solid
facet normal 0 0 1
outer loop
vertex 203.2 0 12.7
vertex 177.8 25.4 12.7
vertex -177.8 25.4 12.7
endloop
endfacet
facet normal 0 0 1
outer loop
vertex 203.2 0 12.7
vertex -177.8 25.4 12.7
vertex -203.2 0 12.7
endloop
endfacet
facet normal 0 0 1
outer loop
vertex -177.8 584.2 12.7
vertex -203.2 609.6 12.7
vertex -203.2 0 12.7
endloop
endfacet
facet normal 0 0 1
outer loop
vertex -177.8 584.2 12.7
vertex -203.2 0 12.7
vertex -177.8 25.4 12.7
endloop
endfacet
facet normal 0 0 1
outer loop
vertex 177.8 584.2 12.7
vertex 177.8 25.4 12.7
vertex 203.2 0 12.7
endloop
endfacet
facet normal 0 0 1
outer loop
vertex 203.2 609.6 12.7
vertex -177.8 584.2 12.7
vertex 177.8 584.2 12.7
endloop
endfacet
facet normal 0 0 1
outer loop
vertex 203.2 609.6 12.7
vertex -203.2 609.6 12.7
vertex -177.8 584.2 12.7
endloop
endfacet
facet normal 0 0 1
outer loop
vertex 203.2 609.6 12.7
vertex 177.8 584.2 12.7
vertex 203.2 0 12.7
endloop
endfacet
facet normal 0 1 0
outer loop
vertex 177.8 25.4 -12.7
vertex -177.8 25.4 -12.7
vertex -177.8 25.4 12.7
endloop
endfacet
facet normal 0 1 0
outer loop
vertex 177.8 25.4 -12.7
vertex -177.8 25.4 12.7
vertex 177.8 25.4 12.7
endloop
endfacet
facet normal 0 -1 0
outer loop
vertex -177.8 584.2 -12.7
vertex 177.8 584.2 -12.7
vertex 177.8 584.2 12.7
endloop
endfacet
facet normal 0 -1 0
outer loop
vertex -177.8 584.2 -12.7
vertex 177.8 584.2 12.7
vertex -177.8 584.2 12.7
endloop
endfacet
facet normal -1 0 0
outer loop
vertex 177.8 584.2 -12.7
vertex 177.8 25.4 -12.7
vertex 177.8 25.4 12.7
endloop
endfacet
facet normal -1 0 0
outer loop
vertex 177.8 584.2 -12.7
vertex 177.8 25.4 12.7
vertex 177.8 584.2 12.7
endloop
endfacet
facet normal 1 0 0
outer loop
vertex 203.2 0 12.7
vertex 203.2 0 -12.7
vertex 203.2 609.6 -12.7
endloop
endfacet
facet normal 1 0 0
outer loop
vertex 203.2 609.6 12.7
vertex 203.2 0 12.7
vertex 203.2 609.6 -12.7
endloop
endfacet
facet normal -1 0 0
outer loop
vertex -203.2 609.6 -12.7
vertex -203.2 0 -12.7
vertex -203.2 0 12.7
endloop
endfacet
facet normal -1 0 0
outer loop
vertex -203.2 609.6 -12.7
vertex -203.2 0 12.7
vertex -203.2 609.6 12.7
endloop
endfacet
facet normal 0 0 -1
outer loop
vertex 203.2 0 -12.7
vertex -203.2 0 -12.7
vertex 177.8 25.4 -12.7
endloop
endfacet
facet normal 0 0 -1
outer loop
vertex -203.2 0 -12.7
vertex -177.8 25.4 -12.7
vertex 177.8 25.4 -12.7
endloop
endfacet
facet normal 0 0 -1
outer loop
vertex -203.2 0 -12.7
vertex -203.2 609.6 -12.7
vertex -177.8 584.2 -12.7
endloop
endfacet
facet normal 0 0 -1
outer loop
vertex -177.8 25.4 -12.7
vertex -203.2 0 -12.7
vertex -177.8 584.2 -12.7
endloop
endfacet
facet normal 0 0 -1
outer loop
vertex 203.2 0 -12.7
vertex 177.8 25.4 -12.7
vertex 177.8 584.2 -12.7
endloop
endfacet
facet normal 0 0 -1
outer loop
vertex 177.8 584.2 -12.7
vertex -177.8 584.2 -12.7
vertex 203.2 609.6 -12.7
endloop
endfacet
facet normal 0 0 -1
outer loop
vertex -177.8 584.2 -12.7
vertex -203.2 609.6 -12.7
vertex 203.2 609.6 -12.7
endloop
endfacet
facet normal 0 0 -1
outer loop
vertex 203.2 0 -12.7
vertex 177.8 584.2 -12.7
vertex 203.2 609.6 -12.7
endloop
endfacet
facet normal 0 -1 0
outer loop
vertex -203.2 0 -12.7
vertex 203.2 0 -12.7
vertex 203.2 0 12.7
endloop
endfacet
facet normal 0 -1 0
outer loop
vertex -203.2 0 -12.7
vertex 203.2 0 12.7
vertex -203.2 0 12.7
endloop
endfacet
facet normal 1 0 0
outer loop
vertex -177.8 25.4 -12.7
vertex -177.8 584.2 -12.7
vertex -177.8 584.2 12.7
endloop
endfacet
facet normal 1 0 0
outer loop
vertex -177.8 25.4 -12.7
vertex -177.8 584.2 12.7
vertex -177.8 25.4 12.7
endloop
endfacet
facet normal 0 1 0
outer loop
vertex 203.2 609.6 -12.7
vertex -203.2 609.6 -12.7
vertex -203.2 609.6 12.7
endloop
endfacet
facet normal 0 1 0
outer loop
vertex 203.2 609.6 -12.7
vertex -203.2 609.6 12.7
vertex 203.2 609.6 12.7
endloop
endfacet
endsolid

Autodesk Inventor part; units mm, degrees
ref_plane "XZ Plane" through (0, 0, 0) normal (0, 1, 0) x (-1, 0, 0)
ref_plane "XY Plane" through (0, 0, 0) normal (0, 0, 1) x (1, 0, 0)
sketch "Sketch1" plane through (0, 0, 0) normal (0, 0, 1) x (1, 0, 0)
  line L0 (0, 0) -> (203.2, 0)
  line L1 (203.2, 0) -> (203.2, 609.6)
  line L2 (203.2, 609.6) -> (0, 609.6)
  line L3 (0, 0) -> (0, 609.6) construction
  line L4 (0, 0) -> (-203.2, 0)
  line L5 (-203.2, 0) -> (-203.2, 609.6)
  line L6 (-203.2, 609.6) -> (0, 609.6)
  line L7 (-177.8, 25.4) -> (177.8, 25.4)
  line L8 (177.8, 25.4) -> (177.8, 584.2)
  line L9 (177.8, 584.2) -> (-177.8, 584.2)
  line L10 (-177.8, 584.2) -> (-177.8, 25.4)
  dimension "d1" = 609.6
  dimension "d2" = 406.4
  dimension "d3" = 25.4
  dimension "d4" = 25.4
  dimension "d5" = 25.4
  dimension "d6" = 25.4
extrude "Extrusion1" add sketch "Sketch1" along normal mid plane 25.4
properties part number "primativeBaseForShortRobot"
